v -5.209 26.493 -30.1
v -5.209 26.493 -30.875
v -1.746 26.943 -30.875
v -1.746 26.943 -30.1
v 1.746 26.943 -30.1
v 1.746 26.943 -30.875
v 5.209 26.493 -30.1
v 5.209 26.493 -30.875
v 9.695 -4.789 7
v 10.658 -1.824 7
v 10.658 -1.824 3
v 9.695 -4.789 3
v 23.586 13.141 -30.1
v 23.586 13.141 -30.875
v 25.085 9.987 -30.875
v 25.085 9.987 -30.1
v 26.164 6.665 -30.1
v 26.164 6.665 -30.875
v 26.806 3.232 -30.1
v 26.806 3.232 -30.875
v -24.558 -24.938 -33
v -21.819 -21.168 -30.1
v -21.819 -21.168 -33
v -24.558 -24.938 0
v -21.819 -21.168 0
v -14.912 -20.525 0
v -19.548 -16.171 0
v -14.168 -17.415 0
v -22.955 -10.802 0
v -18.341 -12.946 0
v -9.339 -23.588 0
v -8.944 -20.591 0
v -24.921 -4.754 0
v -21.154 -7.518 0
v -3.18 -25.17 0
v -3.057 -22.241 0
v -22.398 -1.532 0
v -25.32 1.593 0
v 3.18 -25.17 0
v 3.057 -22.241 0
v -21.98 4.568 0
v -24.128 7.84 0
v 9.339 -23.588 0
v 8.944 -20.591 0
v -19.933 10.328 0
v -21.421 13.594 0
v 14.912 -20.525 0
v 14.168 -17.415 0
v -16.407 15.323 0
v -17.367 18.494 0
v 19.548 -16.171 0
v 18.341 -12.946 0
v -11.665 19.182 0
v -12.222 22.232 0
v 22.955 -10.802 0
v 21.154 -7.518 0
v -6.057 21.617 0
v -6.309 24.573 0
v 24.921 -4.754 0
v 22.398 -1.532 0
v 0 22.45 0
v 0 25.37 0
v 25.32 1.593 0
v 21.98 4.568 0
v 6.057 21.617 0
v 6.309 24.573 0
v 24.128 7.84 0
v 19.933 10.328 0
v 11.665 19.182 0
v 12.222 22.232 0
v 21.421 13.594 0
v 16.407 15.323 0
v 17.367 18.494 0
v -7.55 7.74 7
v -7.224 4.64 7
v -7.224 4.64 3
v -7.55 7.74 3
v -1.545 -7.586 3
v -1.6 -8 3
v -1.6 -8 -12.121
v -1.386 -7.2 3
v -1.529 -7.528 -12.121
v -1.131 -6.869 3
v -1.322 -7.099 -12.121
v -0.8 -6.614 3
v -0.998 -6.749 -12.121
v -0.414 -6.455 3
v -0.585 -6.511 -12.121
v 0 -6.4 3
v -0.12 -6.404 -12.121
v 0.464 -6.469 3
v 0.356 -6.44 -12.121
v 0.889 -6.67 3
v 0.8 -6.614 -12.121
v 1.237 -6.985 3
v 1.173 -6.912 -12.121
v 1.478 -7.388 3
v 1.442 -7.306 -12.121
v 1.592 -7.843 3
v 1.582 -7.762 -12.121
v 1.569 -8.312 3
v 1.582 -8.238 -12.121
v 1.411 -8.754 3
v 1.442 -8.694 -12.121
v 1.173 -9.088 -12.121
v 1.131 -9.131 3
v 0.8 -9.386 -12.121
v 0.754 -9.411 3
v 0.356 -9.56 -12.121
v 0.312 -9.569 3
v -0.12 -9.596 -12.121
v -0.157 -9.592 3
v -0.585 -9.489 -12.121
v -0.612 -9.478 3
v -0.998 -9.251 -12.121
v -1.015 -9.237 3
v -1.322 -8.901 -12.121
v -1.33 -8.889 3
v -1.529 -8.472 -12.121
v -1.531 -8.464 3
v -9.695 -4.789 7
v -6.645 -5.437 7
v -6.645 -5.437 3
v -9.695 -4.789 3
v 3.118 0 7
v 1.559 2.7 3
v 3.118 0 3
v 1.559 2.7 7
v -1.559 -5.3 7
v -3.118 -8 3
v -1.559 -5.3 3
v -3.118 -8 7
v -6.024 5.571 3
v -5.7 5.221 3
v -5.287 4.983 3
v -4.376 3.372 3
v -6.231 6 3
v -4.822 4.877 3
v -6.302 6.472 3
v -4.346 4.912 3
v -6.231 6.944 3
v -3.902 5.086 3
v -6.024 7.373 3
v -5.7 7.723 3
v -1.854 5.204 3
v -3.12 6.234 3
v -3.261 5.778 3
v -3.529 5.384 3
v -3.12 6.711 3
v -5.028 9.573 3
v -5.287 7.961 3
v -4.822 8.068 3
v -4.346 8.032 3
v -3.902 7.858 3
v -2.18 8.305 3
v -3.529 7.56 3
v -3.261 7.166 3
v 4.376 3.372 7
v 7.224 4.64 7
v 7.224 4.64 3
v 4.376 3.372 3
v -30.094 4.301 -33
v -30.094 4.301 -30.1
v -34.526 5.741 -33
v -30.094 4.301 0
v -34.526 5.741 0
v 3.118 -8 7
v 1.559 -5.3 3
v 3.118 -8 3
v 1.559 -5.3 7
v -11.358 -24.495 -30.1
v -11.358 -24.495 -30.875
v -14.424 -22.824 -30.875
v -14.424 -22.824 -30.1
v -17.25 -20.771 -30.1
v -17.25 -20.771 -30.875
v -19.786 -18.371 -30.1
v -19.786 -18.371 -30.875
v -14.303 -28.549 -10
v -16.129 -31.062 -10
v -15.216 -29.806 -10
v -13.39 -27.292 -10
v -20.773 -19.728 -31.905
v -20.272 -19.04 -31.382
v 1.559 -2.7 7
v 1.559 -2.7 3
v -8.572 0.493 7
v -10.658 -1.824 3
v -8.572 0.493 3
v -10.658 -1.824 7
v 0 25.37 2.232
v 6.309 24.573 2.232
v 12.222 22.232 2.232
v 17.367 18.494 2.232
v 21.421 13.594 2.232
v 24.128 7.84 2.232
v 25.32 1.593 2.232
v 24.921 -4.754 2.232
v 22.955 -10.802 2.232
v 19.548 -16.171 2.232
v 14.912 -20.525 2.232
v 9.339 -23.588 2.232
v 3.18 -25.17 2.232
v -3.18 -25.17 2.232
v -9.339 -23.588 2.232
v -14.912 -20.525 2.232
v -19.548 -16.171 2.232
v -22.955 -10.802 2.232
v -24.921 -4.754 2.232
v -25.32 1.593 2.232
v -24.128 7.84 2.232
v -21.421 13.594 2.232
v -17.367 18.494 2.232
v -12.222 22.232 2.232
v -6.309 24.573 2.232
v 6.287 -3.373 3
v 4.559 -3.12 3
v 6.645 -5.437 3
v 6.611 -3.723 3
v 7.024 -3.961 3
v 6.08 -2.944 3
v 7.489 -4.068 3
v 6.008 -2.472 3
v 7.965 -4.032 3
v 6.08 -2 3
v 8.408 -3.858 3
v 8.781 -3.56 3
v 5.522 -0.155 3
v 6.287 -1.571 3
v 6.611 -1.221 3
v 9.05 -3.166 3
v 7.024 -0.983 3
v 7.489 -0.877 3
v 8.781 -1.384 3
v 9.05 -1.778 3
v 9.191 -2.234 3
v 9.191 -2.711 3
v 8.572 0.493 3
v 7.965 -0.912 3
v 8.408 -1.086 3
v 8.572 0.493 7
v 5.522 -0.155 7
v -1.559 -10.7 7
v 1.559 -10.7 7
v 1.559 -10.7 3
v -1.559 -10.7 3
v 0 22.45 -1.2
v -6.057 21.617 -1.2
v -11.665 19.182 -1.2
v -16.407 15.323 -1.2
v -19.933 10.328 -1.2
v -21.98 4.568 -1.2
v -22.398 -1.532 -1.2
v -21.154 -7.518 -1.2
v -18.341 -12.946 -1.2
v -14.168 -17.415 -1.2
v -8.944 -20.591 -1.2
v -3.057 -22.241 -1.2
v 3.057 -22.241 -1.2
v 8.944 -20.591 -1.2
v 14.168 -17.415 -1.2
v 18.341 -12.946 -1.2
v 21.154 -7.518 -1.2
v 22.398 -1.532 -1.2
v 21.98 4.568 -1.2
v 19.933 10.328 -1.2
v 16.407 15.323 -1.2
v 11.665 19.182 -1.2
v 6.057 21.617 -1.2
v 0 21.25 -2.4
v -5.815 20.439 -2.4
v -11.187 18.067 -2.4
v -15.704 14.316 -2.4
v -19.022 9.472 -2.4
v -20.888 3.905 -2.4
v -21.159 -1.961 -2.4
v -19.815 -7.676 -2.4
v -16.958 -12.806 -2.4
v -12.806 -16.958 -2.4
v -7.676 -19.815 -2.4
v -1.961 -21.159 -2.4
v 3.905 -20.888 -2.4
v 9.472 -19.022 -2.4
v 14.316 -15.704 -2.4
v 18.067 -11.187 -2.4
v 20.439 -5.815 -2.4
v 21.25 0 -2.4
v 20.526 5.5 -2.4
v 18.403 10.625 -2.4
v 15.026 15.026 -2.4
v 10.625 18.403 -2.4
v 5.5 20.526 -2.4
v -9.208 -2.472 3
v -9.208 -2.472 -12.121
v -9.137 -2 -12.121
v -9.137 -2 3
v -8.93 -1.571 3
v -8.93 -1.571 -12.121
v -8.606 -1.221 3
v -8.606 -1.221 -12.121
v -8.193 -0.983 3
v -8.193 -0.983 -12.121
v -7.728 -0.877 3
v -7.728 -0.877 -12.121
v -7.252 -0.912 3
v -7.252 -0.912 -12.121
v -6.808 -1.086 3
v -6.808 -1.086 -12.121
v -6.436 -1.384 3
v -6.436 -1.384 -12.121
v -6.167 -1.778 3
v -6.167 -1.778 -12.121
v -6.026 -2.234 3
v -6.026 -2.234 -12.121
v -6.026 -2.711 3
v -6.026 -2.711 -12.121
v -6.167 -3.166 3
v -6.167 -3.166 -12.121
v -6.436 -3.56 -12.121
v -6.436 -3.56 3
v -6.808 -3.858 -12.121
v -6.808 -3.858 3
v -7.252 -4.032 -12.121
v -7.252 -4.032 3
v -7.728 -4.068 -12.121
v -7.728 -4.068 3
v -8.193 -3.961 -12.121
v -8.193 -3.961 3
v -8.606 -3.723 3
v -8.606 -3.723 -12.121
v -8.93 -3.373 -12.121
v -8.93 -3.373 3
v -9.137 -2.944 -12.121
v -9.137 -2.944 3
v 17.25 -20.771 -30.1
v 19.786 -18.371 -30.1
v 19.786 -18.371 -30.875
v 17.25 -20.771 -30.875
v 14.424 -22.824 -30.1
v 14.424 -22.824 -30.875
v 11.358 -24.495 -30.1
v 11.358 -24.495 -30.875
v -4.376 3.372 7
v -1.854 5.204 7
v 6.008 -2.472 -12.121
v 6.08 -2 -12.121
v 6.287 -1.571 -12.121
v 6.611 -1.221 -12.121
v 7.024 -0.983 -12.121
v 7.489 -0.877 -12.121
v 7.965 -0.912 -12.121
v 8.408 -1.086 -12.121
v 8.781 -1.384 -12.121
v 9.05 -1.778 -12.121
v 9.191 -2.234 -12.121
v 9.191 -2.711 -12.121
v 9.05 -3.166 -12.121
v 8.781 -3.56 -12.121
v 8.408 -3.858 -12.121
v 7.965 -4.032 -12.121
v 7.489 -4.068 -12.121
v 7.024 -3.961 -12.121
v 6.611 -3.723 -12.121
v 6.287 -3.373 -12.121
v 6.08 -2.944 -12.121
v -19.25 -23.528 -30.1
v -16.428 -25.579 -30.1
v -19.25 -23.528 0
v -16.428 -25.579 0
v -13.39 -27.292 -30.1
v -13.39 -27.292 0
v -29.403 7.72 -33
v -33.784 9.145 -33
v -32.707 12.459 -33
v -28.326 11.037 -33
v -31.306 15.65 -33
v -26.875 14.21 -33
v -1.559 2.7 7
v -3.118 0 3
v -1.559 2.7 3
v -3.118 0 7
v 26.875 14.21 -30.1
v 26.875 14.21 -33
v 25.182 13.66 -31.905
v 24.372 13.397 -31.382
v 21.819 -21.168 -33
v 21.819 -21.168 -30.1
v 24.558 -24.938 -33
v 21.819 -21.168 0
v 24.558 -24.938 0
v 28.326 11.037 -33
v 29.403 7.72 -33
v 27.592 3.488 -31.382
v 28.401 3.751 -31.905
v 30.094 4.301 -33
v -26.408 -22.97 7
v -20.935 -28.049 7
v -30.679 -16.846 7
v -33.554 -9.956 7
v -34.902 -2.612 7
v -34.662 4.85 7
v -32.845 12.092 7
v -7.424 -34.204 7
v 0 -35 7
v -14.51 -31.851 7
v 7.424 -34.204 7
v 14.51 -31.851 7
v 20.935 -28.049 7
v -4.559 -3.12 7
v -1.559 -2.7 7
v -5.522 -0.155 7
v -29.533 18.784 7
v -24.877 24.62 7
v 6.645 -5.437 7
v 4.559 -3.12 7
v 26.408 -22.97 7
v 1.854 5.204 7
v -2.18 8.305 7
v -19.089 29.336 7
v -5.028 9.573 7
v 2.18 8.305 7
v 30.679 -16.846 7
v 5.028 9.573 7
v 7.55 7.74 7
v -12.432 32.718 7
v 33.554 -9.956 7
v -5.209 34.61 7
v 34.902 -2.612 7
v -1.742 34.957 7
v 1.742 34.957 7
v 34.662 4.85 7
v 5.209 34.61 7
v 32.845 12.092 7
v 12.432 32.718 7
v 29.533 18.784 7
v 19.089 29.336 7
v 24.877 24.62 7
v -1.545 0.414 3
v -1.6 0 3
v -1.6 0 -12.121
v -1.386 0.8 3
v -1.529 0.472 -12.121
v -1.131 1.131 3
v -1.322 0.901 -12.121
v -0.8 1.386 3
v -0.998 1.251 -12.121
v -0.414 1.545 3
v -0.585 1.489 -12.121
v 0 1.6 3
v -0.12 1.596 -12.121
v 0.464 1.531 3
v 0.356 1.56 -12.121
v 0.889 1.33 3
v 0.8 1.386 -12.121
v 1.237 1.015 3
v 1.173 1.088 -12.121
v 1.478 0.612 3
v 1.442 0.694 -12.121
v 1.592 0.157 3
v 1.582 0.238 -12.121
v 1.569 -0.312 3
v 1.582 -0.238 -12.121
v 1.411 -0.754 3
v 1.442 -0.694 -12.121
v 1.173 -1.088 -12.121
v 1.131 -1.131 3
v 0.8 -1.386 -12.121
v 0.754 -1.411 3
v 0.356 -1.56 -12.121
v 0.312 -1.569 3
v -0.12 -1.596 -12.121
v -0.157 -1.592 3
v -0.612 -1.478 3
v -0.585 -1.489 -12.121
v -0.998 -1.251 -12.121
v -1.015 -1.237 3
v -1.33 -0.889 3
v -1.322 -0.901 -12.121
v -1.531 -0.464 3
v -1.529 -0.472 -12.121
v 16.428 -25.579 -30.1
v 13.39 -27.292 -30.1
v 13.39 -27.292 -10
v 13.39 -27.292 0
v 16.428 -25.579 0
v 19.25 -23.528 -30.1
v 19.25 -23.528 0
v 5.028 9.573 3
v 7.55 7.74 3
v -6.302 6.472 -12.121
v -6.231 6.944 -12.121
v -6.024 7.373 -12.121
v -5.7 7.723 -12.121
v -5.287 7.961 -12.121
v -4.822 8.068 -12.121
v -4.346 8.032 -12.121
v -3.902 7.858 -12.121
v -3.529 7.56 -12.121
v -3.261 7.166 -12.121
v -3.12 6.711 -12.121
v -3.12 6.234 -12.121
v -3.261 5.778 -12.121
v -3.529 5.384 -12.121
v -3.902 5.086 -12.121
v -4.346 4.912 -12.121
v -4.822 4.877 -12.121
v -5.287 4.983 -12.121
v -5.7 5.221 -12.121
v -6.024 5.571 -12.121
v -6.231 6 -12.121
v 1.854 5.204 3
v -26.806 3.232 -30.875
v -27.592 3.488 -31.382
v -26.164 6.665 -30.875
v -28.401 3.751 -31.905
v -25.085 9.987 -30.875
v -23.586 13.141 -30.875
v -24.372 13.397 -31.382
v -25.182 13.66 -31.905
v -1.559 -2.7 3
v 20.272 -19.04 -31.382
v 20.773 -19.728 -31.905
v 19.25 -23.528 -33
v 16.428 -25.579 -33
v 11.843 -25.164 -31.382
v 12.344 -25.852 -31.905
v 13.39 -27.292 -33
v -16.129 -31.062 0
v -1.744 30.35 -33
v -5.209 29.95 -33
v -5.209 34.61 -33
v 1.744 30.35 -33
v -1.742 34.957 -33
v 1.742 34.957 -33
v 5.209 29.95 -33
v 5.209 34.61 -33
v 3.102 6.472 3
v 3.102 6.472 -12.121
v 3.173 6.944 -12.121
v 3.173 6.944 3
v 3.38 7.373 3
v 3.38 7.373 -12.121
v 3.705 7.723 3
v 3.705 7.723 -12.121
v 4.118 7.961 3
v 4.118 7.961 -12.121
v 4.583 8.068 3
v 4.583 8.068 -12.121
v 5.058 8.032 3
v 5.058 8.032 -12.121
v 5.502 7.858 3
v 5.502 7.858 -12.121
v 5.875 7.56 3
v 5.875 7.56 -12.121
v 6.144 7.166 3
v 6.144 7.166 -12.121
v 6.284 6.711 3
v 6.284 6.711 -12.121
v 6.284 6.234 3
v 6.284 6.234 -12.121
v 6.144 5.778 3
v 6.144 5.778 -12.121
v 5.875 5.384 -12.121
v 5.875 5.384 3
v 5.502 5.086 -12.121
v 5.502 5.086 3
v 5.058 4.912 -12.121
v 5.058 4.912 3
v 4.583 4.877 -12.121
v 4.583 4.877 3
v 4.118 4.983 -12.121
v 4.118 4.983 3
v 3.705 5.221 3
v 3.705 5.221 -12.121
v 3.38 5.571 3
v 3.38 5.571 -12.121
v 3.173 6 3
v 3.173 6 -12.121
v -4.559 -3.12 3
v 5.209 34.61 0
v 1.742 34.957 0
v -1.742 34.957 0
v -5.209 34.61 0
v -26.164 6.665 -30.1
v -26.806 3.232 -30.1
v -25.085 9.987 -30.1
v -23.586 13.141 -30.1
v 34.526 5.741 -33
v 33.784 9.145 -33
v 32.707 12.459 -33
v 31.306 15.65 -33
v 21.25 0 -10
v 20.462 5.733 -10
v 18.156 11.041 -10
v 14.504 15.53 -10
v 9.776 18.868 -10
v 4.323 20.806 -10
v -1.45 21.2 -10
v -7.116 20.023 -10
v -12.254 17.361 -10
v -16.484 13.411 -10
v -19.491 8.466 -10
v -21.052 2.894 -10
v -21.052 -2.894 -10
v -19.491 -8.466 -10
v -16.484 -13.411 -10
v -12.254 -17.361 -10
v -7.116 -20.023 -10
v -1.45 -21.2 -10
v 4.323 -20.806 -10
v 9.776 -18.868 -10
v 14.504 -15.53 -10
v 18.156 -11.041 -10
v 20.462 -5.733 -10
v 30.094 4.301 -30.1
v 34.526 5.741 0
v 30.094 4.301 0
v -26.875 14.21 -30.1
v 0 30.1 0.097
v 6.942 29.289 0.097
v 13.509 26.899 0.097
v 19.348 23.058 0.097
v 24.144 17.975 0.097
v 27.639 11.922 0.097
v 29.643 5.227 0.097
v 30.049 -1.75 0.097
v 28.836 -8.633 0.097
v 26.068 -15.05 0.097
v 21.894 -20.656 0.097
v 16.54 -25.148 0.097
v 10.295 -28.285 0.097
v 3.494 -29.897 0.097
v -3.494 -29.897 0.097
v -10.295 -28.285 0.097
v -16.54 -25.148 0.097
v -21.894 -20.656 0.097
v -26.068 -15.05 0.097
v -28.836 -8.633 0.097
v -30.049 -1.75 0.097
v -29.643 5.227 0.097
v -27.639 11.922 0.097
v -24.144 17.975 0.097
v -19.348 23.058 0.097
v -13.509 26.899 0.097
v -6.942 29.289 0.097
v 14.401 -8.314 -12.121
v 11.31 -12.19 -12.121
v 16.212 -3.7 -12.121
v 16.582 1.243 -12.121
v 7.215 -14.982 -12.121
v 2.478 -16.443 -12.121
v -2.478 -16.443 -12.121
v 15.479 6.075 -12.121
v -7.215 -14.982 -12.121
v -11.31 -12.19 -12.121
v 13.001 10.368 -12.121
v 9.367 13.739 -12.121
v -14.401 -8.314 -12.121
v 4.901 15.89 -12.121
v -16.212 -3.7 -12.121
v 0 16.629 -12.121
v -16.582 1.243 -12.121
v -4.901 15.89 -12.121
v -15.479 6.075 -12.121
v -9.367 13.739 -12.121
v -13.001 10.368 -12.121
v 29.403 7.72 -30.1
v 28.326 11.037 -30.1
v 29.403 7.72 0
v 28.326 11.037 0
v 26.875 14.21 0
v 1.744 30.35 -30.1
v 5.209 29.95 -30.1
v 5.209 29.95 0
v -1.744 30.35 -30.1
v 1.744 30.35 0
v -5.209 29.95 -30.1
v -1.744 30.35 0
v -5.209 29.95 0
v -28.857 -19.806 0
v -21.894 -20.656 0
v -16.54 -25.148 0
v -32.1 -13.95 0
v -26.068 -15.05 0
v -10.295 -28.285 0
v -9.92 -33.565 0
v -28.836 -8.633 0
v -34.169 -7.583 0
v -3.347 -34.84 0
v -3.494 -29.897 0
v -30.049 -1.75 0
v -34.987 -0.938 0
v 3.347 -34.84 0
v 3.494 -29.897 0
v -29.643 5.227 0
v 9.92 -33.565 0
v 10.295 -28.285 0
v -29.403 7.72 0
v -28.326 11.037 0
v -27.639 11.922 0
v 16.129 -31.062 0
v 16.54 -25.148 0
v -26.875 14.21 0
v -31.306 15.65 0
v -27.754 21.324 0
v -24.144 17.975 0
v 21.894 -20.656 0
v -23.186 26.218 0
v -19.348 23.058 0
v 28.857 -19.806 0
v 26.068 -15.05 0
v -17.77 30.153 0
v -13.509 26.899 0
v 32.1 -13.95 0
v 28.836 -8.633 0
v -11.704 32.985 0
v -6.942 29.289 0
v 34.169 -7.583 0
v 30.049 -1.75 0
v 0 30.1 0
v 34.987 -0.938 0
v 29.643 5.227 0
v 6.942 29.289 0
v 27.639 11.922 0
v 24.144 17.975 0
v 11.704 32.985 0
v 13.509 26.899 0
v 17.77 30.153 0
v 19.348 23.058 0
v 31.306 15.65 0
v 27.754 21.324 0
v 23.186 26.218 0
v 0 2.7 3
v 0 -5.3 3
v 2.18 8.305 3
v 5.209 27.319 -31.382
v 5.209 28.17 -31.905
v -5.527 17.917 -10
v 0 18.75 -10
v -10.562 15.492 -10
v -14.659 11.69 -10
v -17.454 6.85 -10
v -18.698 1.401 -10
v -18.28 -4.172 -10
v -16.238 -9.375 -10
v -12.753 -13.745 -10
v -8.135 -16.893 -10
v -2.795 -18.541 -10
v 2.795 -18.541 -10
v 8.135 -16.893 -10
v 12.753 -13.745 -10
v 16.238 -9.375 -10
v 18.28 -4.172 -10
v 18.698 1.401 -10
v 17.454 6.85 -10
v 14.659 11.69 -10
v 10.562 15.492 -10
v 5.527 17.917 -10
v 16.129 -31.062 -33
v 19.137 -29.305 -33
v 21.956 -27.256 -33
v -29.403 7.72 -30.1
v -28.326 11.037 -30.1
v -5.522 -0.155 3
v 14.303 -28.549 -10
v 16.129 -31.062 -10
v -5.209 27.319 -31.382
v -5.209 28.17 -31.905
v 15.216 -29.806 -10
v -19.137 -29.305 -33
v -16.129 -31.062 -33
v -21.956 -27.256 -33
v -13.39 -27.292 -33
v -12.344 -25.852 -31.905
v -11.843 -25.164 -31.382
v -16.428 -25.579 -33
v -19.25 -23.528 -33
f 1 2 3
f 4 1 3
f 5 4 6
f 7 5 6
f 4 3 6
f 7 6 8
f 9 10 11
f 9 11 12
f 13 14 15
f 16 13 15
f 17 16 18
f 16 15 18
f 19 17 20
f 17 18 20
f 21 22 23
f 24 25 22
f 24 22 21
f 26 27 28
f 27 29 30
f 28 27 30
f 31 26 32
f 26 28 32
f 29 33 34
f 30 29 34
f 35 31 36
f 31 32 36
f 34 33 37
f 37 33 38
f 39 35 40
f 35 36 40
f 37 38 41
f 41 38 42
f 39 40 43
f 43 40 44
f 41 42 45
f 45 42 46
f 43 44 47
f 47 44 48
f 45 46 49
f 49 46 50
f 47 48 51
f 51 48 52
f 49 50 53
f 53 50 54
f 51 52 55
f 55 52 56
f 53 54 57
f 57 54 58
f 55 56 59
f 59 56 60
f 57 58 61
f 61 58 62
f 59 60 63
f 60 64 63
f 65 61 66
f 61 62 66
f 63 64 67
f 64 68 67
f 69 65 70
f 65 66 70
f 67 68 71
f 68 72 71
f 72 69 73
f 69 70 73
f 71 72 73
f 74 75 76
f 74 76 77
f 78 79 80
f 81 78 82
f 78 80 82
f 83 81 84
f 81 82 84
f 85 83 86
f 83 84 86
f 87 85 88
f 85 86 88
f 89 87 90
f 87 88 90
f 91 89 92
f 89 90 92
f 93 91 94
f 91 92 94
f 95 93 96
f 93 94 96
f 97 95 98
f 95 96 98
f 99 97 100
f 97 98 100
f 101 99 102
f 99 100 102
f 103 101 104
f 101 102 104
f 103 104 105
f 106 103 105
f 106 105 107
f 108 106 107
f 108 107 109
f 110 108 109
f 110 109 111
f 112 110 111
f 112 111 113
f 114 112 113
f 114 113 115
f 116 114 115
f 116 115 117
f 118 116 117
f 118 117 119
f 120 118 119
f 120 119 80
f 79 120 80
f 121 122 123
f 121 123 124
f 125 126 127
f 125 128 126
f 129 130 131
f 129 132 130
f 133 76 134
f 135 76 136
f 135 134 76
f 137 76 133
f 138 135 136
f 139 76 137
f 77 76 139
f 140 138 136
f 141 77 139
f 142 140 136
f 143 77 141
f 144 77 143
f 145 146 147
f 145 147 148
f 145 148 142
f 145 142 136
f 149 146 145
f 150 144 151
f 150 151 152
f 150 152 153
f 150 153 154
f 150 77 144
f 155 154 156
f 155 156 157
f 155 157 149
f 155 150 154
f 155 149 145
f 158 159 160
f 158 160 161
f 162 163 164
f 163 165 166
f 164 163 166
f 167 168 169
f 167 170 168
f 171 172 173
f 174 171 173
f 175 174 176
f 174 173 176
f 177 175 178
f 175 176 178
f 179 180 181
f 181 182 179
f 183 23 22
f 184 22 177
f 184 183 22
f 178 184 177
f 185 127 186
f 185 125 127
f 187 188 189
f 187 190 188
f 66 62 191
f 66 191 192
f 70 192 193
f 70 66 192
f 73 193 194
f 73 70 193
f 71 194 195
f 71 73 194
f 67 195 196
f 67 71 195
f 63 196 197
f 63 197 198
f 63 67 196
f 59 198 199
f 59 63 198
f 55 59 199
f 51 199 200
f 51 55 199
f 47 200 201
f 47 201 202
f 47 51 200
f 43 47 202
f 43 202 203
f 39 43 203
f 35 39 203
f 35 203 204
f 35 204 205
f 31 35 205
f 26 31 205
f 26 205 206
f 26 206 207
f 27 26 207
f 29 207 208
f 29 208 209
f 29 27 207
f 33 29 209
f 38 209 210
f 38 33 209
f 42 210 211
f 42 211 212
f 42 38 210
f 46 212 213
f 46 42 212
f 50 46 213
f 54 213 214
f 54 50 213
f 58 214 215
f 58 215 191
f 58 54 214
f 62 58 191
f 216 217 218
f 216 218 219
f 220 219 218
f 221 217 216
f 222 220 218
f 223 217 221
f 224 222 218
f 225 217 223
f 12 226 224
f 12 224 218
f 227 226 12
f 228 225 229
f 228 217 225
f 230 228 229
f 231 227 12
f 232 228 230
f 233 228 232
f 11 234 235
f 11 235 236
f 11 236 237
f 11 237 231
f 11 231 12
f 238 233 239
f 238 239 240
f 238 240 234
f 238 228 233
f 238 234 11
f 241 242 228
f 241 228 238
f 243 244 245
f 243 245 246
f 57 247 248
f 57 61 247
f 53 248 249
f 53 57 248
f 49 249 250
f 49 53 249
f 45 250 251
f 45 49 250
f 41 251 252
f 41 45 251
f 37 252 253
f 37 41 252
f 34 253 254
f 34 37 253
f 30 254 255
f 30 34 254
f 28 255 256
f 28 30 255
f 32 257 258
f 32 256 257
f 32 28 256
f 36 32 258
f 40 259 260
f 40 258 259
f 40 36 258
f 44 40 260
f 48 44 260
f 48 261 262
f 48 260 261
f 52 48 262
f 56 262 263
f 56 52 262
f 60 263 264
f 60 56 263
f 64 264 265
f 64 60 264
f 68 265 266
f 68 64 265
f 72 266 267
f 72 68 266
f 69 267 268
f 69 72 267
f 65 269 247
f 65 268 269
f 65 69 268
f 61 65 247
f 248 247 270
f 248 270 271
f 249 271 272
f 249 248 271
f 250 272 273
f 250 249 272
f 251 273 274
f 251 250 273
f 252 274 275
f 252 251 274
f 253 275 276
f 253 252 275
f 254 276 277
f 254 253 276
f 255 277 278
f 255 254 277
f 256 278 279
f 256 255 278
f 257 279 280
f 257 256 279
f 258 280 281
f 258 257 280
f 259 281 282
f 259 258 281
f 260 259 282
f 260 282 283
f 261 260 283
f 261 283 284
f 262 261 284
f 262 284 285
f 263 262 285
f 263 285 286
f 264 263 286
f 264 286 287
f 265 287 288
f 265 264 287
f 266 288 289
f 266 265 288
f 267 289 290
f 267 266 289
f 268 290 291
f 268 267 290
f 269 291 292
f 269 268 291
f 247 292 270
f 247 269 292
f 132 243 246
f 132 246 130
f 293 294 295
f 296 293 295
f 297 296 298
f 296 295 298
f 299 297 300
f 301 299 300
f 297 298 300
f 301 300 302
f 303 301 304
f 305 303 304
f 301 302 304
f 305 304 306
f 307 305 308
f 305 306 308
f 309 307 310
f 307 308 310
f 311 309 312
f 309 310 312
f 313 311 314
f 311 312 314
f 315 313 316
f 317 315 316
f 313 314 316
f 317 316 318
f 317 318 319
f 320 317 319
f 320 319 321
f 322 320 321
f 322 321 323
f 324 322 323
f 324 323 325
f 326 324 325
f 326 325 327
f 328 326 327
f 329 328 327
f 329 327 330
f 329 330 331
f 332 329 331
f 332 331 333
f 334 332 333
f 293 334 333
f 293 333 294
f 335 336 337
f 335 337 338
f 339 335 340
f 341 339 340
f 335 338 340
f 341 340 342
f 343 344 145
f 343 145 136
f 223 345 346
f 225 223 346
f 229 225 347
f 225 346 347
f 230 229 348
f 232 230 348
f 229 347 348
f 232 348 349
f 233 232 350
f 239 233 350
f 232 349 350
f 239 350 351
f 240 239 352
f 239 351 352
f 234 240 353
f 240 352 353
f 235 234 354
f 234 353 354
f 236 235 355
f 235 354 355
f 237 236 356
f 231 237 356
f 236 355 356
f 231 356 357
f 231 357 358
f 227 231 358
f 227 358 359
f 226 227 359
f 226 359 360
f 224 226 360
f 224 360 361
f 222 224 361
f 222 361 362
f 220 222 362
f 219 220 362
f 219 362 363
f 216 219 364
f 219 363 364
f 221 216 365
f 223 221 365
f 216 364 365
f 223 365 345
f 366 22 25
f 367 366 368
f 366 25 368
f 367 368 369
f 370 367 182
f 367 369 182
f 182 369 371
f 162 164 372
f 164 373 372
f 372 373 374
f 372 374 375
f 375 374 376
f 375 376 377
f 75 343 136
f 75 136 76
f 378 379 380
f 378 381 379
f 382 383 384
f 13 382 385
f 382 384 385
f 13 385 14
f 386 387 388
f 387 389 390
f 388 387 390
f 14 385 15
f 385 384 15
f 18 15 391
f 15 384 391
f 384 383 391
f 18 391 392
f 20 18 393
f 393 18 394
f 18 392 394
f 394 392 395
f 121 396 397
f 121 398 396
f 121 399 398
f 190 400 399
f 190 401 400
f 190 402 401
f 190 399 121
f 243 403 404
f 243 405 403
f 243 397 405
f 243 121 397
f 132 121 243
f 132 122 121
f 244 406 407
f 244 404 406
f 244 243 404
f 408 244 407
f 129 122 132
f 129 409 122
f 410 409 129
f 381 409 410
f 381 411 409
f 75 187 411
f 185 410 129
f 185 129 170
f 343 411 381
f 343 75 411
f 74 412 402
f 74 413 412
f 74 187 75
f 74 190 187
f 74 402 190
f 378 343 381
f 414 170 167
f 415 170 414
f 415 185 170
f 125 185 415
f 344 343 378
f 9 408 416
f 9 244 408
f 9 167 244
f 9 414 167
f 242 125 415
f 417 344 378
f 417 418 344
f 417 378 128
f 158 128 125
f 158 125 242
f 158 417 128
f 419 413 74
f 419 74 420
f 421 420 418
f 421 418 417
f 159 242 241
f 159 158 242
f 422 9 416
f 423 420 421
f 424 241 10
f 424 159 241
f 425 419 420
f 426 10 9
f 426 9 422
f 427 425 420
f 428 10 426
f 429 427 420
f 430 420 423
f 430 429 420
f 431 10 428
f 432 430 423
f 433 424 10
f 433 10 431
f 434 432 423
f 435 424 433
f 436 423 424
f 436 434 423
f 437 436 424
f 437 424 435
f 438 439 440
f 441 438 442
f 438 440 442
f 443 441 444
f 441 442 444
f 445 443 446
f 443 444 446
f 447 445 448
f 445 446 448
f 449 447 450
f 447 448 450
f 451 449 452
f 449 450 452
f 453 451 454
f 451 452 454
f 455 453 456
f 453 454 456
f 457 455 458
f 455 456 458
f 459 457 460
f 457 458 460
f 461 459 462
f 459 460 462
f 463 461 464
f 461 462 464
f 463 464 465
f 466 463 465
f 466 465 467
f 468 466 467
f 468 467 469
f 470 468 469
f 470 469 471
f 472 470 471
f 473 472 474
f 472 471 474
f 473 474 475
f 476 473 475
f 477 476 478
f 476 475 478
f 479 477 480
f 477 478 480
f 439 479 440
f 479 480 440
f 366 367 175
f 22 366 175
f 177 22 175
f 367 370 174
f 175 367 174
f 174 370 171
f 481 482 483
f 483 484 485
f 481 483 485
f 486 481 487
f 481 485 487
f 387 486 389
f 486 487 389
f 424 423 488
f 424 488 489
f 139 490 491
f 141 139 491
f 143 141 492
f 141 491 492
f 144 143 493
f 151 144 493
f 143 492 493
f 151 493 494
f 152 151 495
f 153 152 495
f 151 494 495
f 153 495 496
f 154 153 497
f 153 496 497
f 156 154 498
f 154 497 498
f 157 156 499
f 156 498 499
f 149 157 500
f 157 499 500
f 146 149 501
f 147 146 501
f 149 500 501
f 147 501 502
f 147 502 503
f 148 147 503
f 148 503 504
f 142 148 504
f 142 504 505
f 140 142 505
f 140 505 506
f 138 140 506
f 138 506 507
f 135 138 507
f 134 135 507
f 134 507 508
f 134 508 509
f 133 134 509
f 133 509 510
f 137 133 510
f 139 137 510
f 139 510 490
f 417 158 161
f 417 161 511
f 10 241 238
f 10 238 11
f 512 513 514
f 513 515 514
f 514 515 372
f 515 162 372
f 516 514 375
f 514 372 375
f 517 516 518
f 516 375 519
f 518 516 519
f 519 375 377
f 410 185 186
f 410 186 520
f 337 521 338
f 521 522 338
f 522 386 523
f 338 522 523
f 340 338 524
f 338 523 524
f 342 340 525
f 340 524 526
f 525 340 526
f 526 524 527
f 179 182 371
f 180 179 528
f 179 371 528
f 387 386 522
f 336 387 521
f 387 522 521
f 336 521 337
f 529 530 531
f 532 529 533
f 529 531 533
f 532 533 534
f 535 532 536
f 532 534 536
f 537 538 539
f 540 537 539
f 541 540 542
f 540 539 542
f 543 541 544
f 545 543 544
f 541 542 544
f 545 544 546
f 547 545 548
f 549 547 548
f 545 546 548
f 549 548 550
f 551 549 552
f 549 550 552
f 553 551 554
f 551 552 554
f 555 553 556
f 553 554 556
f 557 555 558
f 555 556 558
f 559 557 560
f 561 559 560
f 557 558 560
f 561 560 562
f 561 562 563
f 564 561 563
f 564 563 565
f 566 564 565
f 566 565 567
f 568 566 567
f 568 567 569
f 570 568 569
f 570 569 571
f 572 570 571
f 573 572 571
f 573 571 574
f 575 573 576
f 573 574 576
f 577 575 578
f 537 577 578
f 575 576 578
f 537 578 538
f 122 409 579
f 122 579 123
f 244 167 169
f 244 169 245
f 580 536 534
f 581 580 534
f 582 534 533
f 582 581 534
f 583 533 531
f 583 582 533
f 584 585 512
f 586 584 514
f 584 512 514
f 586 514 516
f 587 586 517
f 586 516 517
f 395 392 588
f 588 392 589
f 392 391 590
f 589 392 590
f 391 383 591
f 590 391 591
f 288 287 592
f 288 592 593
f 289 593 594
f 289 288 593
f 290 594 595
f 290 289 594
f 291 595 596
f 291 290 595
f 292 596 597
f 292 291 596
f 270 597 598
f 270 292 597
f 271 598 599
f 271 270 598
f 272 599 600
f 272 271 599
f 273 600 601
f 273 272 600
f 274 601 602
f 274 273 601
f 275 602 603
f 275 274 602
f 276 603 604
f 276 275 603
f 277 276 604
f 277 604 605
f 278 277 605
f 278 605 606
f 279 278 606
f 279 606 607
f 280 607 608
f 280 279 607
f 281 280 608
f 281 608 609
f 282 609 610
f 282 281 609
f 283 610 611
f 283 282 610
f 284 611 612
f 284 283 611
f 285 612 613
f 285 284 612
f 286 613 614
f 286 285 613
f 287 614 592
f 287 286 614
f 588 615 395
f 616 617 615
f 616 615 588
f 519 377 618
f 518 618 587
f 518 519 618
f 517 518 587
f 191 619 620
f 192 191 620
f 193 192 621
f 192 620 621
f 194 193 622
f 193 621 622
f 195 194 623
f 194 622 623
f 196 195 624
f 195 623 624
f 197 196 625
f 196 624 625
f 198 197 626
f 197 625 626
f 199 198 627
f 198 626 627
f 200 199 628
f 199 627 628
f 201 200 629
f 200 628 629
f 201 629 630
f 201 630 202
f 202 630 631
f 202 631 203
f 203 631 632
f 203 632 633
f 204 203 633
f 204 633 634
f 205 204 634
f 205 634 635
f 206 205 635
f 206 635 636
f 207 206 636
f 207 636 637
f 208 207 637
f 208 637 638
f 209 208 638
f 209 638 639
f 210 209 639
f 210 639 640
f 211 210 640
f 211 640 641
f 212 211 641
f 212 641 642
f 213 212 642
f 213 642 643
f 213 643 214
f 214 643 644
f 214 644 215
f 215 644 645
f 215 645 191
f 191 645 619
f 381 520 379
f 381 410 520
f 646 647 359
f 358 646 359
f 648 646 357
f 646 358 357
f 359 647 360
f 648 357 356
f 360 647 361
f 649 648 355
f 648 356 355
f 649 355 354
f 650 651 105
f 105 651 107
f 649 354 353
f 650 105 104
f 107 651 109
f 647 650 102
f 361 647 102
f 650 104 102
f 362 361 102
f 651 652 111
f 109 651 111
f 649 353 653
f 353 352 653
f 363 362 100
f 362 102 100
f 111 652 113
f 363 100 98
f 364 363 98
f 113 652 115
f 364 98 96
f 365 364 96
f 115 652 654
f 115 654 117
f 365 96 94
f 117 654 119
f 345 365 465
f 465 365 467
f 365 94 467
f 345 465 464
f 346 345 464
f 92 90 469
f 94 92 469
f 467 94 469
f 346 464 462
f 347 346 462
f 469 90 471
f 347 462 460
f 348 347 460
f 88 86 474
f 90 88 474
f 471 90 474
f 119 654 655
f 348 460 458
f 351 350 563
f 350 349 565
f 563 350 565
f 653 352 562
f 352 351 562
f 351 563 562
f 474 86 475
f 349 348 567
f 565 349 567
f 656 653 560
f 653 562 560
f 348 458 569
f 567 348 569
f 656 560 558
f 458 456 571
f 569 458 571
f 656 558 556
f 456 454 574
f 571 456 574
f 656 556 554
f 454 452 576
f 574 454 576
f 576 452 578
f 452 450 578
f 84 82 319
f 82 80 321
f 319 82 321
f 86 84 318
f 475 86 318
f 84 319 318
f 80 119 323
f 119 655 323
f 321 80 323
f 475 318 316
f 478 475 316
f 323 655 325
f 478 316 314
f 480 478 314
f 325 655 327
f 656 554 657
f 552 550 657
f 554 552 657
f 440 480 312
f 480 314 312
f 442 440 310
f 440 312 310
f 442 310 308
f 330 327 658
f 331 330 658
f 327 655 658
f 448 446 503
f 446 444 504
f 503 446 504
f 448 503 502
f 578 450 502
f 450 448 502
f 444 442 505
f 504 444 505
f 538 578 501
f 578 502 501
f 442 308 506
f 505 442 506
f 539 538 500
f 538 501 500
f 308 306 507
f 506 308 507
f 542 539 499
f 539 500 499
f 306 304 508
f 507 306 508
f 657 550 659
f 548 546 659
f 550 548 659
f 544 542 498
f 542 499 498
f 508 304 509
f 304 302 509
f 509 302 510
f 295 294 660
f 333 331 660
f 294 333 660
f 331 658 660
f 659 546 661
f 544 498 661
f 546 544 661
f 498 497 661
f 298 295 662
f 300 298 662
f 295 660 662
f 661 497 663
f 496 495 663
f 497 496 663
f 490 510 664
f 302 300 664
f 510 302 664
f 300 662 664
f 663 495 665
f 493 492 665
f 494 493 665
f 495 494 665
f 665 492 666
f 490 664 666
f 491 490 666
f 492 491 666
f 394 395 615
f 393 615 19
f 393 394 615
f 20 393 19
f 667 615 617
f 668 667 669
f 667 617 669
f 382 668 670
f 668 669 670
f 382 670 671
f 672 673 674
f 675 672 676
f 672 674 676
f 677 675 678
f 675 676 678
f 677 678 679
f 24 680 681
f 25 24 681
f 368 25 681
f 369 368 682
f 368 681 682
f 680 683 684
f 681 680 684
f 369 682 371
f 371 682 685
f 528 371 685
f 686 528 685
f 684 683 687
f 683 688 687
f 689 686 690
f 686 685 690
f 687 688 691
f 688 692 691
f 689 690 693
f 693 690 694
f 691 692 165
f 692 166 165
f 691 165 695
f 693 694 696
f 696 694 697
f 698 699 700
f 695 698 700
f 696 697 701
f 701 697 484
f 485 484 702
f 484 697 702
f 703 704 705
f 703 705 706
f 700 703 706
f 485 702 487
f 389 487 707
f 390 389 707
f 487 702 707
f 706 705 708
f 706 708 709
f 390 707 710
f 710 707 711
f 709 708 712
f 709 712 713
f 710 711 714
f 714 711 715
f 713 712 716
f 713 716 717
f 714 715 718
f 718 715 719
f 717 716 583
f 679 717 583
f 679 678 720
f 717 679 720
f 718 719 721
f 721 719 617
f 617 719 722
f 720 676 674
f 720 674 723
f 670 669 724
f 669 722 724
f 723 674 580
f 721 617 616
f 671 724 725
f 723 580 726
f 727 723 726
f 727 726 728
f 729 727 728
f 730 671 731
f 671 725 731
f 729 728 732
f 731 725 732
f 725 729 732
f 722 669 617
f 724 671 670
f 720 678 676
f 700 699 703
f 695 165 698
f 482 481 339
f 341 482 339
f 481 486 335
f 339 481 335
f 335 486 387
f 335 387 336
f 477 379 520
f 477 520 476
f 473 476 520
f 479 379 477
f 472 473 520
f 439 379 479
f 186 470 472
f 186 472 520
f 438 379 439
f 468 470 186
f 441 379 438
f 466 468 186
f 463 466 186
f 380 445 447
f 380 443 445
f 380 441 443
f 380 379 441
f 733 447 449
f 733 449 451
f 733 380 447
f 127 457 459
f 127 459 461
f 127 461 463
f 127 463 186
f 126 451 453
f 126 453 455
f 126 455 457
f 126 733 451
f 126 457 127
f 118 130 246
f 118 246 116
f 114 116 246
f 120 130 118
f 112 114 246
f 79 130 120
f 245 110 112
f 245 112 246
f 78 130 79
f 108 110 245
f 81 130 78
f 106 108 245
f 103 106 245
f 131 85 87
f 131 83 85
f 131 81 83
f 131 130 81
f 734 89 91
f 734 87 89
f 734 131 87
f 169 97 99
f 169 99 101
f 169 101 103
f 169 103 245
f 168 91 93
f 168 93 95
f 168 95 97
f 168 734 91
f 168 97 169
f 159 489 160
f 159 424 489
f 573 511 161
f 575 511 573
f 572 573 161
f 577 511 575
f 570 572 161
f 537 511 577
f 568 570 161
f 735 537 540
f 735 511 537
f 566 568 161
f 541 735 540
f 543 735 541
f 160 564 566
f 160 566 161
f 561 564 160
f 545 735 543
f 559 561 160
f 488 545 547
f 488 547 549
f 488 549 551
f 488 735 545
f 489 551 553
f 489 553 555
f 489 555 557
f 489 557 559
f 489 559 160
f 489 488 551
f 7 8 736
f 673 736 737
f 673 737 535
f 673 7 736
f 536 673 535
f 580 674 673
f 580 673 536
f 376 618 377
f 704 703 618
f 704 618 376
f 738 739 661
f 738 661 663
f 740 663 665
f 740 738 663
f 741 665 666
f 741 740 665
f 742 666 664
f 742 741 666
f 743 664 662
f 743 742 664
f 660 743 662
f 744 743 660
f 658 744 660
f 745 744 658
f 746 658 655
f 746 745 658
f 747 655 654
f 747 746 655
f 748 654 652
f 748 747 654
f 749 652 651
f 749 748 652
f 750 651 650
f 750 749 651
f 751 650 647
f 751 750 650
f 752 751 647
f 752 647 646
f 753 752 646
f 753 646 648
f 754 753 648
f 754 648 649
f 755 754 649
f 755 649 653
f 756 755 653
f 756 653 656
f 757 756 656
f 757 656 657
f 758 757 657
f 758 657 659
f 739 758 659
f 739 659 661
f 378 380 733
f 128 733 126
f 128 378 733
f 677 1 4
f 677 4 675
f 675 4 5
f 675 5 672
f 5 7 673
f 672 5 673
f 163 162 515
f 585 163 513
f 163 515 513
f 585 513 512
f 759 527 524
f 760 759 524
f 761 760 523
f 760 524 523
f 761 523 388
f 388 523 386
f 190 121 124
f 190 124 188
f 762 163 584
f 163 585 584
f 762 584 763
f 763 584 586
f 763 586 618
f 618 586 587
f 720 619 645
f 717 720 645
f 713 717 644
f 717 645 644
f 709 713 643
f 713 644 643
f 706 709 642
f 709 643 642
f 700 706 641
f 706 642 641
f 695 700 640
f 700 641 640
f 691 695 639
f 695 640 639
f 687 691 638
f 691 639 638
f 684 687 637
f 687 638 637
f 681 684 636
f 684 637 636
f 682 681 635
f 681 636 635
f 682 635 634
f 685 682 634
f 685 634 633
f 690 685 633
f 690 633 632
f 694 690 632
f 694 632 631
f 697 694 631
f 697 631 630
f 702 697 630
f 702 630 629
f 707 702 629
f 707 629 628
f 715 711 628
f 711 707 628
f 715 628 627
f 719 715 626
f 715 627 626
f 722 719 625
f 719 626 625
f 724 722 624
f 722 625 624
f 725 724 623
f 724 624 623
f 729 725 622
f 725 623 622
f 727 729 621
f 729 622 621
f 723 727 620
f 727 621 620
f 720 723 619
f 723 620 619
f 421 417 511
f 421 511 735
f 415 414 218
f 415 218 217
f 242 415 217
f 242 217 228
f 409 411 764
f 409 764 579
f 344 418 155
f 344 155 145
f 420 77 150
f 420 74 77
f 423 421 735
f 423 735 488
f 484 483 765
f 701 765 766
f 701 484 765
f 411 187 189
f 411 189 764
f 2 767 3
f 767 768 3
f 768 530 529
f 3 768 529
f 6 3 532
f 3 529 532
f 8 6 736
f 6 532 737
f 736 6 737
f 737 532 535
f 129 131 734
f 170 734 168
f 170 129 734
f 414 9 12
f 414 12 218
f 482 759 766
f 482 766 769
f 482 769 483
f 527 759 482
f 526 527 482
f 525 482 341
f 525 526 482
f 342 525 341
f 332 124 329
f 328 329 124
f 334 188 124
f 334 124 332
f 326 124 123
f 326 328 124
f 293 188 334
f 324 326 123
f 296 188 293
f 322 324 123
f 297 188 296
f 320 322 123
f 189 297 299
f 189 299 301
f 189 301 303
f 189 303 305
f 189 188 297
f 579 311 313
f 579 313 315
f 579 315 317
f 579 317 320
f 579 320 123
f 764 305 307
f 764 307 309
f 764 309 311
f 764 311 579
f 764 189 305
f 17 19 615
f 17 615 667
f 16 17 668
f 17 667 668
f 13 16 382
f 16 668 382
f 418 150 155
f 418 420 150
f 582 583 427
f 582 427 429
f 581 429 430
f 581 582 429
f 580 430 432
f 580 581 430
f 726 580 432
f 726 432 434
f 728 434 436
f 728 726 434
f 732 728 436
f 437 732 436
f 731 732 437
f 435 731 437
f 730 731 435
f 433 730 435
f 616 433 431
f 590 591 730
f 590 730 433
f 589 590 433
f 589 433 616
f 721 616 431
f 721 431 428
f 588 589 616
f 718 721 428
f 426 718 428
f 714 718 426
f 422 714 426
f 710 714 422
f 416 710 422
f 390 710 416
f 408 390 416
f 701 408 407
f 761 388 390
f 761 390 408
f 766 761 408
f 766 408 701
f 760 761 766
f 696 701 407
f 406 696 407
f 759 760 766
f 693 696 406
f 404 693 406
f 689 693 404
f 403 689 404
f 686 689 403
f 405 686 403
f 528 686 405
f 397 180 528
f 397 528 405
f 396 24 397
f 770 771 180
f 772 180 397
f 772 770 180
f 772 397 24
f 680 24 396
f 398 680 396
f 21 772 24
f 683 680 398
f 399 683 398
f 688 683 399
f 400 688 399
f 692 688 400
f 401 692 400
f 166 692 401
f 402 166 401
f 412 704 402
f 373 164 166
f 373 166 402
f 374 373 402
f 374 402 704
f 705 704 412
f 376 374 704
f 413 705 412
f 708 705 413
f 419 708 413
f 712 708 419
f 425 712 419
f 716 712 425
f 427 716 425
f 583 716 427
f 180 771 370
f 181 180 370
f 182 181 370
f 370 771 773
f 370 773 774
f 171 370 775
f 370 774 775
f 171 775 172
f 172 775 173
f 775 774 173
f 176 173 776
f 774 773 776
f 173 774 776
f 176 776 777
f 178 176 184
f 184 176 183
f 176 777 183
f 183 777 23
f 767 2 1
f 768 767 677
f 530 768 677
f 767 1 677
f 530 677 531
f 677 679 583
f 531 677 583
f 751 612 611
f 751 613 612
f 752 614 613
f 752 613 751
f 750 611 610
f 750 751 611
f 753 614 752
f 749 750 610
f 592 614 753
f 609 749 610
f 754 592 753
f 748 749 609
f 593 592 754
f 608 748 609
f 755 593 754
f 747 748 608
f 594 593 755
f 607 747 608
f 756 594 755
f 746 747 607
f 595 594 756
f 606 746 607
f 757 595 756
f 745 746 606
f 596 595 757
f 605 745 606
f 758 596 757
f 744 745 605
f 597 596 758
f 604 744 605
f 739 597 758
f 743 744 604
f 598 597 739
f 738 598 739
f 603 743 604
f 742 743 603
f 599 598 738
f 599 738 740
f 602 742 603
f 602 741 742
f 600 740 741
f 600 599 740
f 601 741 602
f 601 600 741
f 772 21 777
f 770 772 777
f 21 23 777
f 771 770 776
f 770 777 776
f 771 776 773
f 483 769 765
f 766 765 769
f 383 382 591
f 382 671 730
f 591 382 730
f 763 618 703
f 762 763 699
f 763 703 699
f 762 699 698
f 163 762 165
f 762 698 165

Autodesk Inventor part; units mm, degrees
ref_plane "YZ Plane" through (0, 0, 0) normal (1, 0, 0) x (0, 1, 0)
ref_plane "XZ Plane" through (0, 0, 0) normal (0, 1, 0) x (-1, 0, 0)
ref_plane "XY Plane" through (0, 0, 0) normal (0, 0, 1) x (1, 0, 0)
sketch "Эскиз1" plane through (0, 0, 0) normal (0, 0, 1) x (1, 0, 0)
  circle A0 centre (0, 0) radius 21.25 projected
  circle A1 centre (0, 0) radius 30 projected
  circle A2 centre (0, 0) radius 21.25
  circle A3 centre (0, 0) radius 30
  circle A4 centre (0, 0) radius 35
  line L0 (0, 0) -> (6.0777, 34.4683)
  line L1 (0, 0) -> (35, 0) construction
  line L2 (0, 0) -> (-6.0777, 34.4683)
  line L3 (0, 0) -> (35, 0) construction
  line L4 (-5.2094, 29.5442) -> (-5.2094, 34.6101)
  line L5 (5.2094, 29.5442) -> (5.2094, 34.6101)
  line L6 (-26.4884, 14.0841) -> (-31.3064, 15.6496)
  line L7 (-29.708, 4.1752) -> (-34.526, 5.7406)
  line L8 (-21.5802, -20.8398) -> (-24.5579, -24.9382)
  line L9 (-13.1511, -26.9638) -> (-16.1288, -31.0622)
  line L10 (13.1511, -26.9638) -> (16.1288, -31.0622)
  line L11 (21.5802, -20.8398) -> (24.5579, -24.9382)
  line L12 (29.708, 4.1752) -> (34.526, 5.7406)
  line L13 (26.4884, 14.0841) -> (31.3064, 15.6496)
  circle A5 centre (0, 0) radius 30.4
  point P0 (0, 0)
  point P1 (5.2094, 29.5442)
  point P2 (-5.2094, 29.5442)
  point P3 (-5.2094, 29.9503)
  point P4 (5.2094, 29.9503)
  point P5 (26.8746, 14.2096)
  point P6 (30.0943, 4.3007)
  point P7 (-30.0943, 4.3007)
  point P8 (-26.8746, 14.2096)
  point P9 (-13.3898, -27.2924)
  point P10 (-21.8189, -21.1683)
  point P11 (21.8189, -21.1683)
  point P12 (13.3898, -27.2924)
  dimension "d0" = 70
  dimension "d1" = 80
  dimension "d2" = 100
  dimension "d5" = 360
  dimension "d19" = 0.4
extrude "Выдавливание1" add sketch "Эскиз1" against normal blind 33 contours A0 L2 L0 | L0 L2 A0 | A5 L4 A4 L5 | L13 A4 L12 A5 | A5 L7 A4 L6 | A5 L9 A4 L8 | L11 A4 L10 A5
sketch "Эскиз2" plane through (0, 0, 0) normal (1, 0, 0) x (0, 1, 0)
  line L0 (30, -23) -> (30, 0) projected
  line L1 (-30, -19.93) -> (30, -19.93) projected
  line L2 (0, 0) -> (0, -33)
  line L3 (-21.25, -33) -> (21.25, -33) projected
  line L4 (22.45, -18.73) -> (21.25, -17.53)
  line L5 (22.45, -19.93) -> (22.45, -18.73)
  line L6 (21.25, 0) -> (21.25, -33) projected
  line L7 (-30, -19.93) -> (30, -19.93) projected
  line L8 (21.25, -2.4) -> (22.45, -1.2)
  line L9 (22.45, -1.2) -> (22.45, 0)
  line L10 (30, 0) -> (-30, 0) projected
  line L11 (30.4, -33) -> (30.4, 0) projected
  line L12 (30.4, -33) -> (30.4, 0) projected
  line L13 (30.4, -33) -> (30.4, 0) projected
  line L14 (-30, -29.93) -> (30, -29.93) projected
  line L15 (20.7199, -30.23) -> (27.0363, -30.23) projected
  line L16 (30.4, -33) -> (30.4, 0) projected
  line L17 (30.4, -33) -> (30.4, -30.1)
  line L18 (30.4, -33) -> (30.4, 0) projected
  line L19 (30.4, -30.1) -> (26.4, -30.1)
  line L20 (26.4, -30.1) -> (26.4, -30.5)
  line L21 (26.4, -30.1) -> (26.8, -30.1) construction
  line L22 (26.4, -30.5) -> (30.4, -33)
  point P0 (21.25, -19.93)
  dimension "d25" = 2.9
  dimension "d26" = 4
  dimension "d27" = 0.4
  dimension "d28" = 90
revolve "Вращение1" add sketch "Эскиз2" angle 360 about axis through (0, 0, 0) along (0, 0, -1) contours L20 L19 L11 L22 | L1 L6 L4 L5 | L9 L8 L6 L10
sketch "Эскиз3" plane through (0, 0, -33) normal (0, 0, -1) x (-1, 0, 0)
  arc A0 (5.2094, 34.6101) -> (-5.2094, 34.6101) centre (0, 0) ccw projected
  line L0 (-5.2094, 34.6101) -> (-5.2094, 26.4927)
  line L1 (5.2094, 34.6101) -> (5.2094, 26.4927)
  circle A1 centre (0, 0) radius 35
  line L2 (-31.3064, 15.6496) -> (-23.5862, 13.1412)
  line L3 (-34.526, 5.7406) -> (-26.8058, 3.2322)
  line L4 (-24.5579, -24.9382) -> (-19.7865, -18.371)
  line L5 (-16.1288, -31.0622) -> (-11.3575, -24.4951)
  line L6 (16.1288, -31.0622) -> (11.3575, -24.4951)
  line L7 (24.5579, -24.9382) -> (19.7865, -18.371)
  line L8 (34.526, 5.7406) -> (26.8058, 3.2322)
  line L9 (31.3064, 15.6496) -> (23.5862, 13.1412)
  circle A2 centre (0, 0) radius 27
  point P0 (0, 0)
  point P1 (5.2094, 34.6101)
  point P2 (5.2094, 34.6101)
  dimension "d13" = 360
extrude "Выдавливание2" cut sketch "Эскиз3" against normal blind 23 contours A1 L9 A2 L1 | L0 A2 L2 A1 | A2 | A1 L7 A2 L8 | L3 A2 L4 A1 | L5 A2 L6 A1
sketch "Эскиз4" plane through (0, 0, 0) normal (0, 0, 1) x (1, 0, 0)
  arc A0 (5.2094, 34.6101) -> (-5.2094, 34.6101) centre (0, 0) ccw projected
  circle A1 centre (0, 0) radius 35
  point P0 (0, 0)
  point P1 (5.2094, 34.6101)
extrude "Выдавливание3" add sketch "Эскиз4" along normal blind 7
sketch "Эскиз5" plane through (0, 0, 0) normal (1, 0, 0) x (0, 1, 0)
  line L0 (-21.25, -10) -> (21.25, -10) projected
  line L1 (21.25, -10) -> (-21.25, -10) projected
  line L2 (21.25, -10) -> (18.75, -10)
  line L3 (18.75, -10) -> (16.6287, -12.1213)
  line L4 (16.6287, -12.1213) -> (0, -12.1213)
  line L5 (14.2096, 0) -> (14.2096, -30.1) projected
  line L6 (0, -12.1213) -> (0, -10)
  point P0 (0, 0)
  dimension "d29" = 2.5
  dimension "d30" = 3
  dimension "d31" = 135
revolve "Вращение2" add sketch "Эскиз5" angle 360 about axis through (0, 0, -12.1213) along (0, 0, 1)
sketch "Эскиз6" plane through (0, 0, 0) normal (1, 0, 0) x (0, 1, 0)
  line L0 (25.52, -29.93) -> (25.52, 0)
  line L1 (25.52, 0) -> (25.52, 2)
  line L2 (30.4, -30.1) -> (30.4, 0) projected
  line L3 (29.9503, 0) -> (29.9503, -30.1) projected
  line L4 (25.52, 2) -> (29.9503, 0)
  line L5 (30.1003, -30.1) -> (30.1003, 0.0969)
  line L6 (30.1003, 0.0969) -> (25.37, 2.2323)
  line L7 (25.37, 2.2323) -> (25.37, 0)
  line L8 (25.37, 0) -> (25.37, -29.93)
  line L9 (35, 7) -> (-35, 7) projected
  line L10 (0, 7) -> (0, 0)
  line L11 (25.37, 0) -> (30.3149, 0)
  line L12 (34.6101, 0) -> (15.6496, 0) projected
  point P0 (30.1003, 0)
  dimension "d33" = 0.15
revolve "Вращение3" cut sketch "Эскиз6" angle 360 about axis through (0, 0, 7) along (0, 0, -1)
sketch "Эскиз7" plane through (0, 0, -12.1213) normal (0, 0, -1) x (-1, 0, 0)
  line L0 (15.0382, 14.3621) -> (21.6953, 20.7199) projected
  arc A0 (21.6953, 20.7199) -> (13.0016, 27.0363) centre (0, 0) ccw projected
  line L1 (13.0016, 27.0363) -> (9.0121, 18.7403) projected
  arc A1 (-9.0121, 18.7403) -> (9.0121, 18.7403) centre (0, 23.0741) ccw projected
  line L2 (-9.0121, 18.7403) -> (-13.0016, 27.0363) projected
  arc A2 (-13.0016, 27.0363) -> (-21.6953, 20.7199) centre (0, 0) ccw projected
  line L3 (-21.6953, 20.7199) -> (-15.0382, 14.3621) projected
  arc A3 (-20.608, -2.7799) -> (-15.0382, 14.3621) centre (-21.9448, 7.1303) ccw projected
  line L4 (-20.608, -2.7799) -> (-29.7307, -4.0106) projected
  arc A4 (-29.7307, -4.0106) -> (-26.41, -14.2307) centre (0, 0) ccw projected
  line L5 (-26.41, -14.2307) -> (-18.3062, -9.864) projected
  arc A5 (-3.7243, -20.4584) -> (-18.3062, -9.864) centre (-13.5626, -18.6674) ccw projected
  line L6 (-3.7243, -20.4584) -> (-5.373, -29.5149) projected
  arc A6 (-5.373, -29.5149) -> (5.373, -29.5149) centre (0, 0) ccw projected
  line L7 (5.373, -29.5149) -> (3.7243, -20.4584) projected
  arc A7 (18.3062, -9.864) -> (3.7243, -20.4584) centre (13.5626, -18.6674) ccw projected
  line L8 (18.3062, -9.864) -> (26.41, -14.2307) projected
  arc A8 (26.41, -14.2307) -> (29.7307, -4.0106) centre (0, 0) ccw projected
  line L9 (29.7307, -4.0106) -> (20.608, -2.7799) projected
  arc A9 (15.0382, 14.3621) -> (20.608, -2.7799) centre (21.9448, 7.1303) ccw projected
  circle A10 centre (-4.7023, 6.4721) radius 1.6 projected
  circle A11 centre (0, 0) radius 1.6 projected
  circle A12 centre (0, -8) radius 1.6 projected
  circle A13 centre (4.7023, 6.4721) radius 1.6 projected
  circle A14 centre (7.6085, -2.4721) radius 1.6 projected
  circle A15 centre (-7.6085, -2.4721) radius 1.6 projected
  line L10 (15.0382, 14.3621) -> (21.6953, 20.7199) projected
  arc A16 (21.6953, 20.7199) -> (13.0016, 27.0363) centre (0, 0) ccw projected
  line L11 (13.0016, 27.0363) -> (9.0121, 18.7403) projected
  arc A17 (-9.0121, 18.7403) -> (9.0121, 18.7403) centre (0, 23.0741) ccw projected
  line L12 (-9.0121, 18.7403) -> (-13.0016, 27.0363) projected
  arc A18 (-13.0016, 27.0363) -> (-21.6953, 20.7199) centre (0, 0) ccw projected
  line L13 (-21.6953, 20.7199) -> (-15.0382, 14.3621) projected
  arc A19 (-20.608, -2.7799) -> (-15.0382, 14.3621) centre (-21.9448, 7.1303) ccw projected
  line L14 (-20.608, -2.7799) -> (-29.7307, -4.0106) projected
  arc A20 (-29.7307, -4.0106) -> (-26.41, -14.2307) centre (0, 0) ccw projected
  line L15 (-26.41, -14.2307) -> (-18.3062, -9.864) projected
  arc A21 (-3.7243, -20.4584) -> (-18.3062, -9.864) centre (-13.5626, -18.6674) ccw projected
  line L16 (-3.7243, -20.4584) -> (-5.373, -29.5149) projected
  arc A22 (-5.373, -29.5149) -> (5.373, -29.5149) centre (0, 0) ccw projected
  line L17 (5.373, -29.5149) -> (3.7243, -20.4584) projected
  arc A23 (18.3062, -9.864) -> (3.7243, -20.4584) centre (13.5626, -18.6674) ccw projected
  line L18 (18.3062, -9.864) -> (26.41, -14.2307) projected
  arc A24 (26.41, -14.2307) -> (29.7307, -4.0106) centre (0, 0) ccw projected
  line L19 (29.7307, -4.0106) -> (20.608, -2.7799) projected
  arc A25 (15.0382, 14.3621) -> (20.608, -2.7799) centre (21.9448, 7.1303) ccw projected
  point P0 (0, 0)
extrude "Выдавливание4" cut sketch "Эскиз7" against normal up to surface (19.1213 mm away) contours A10 | A11 | A12 | A13 | A14 | A15
sketch "Эскиз8" plane through (0, 0, 7) normal (0, 0, 1) x (1, 0, 0)
  circle A0 centre (0, 0) radius 1.6 projected
  line L0 (0, 0) -> (0, 2.7)
  circle A1 centre (0, -8) radius 1.6 projected
  line L1 (0, -8) -> (0, -5.3)
  line L2 (1.5588, -5.3) -> (3.1177, -8)
  line L3 (3.1177, -8) -> (1.5588, -10.7)
  line L4 (1.5588, -10.7) -> (-1.5588, -10.7)
  line L5 (-1.5588, -10.7) -> (-3.1177, -8)
  line L6 (-3.1177, -8) -> (-1.5588, -5.3)
  line L7 (-1.5588, -5.3) -> (1.5588, -5.3)
  line L8 (1.5588, 2.7) -> (3.1177, 0)
  line L9 (3.1177, 0) -> (1.5588, -2.7)
  line L10 (1.5588, -2.7) -> (-1.5588, -2.7)
  line L11 (-1.5588, -2.7) -> (-3.1177, 0)
  line L12 (-3.1177, 0) -> (-1.5588, 2.7)
  line L13 (-1.5588, 2.7) -> (1.5588, 2.7)
  line L14 (4.5589, -3.1203) -> (5.5223, -0.1552)
  line L15 (7.6085, -2.4721) -> (5.0406, -1.6378)
  line L16 (6.645, -5.4372) -> (4.5589, -3.1203)
  line L17 (9.6946, -4.789) -> (6.645, -5.4372)
  line L18 (10.658, -1.8239) -> (9.6946, -4.789)
  line L19 (8.5719, 0.493) -> (10.658, -1.8239)
  line L20 (5.5223, -0.1552) -> (8.5719, 0.493)
  line L21 (4.3764, 3.3715) -> (1.8541, 5.2041)
  line L22 (4.7023, 6.4721) -> (3.1153, 4.2878)
  line L23 (7.2245, 4.6396) -> (4.3764, 3.3715)
  line L24 (7.5504, 7.7402) -> (7.2245, 4.6396)
  line L25 (5.0282, 9.5727) -> (7.5504, 7.7402)
  line L26 (2.18, 8.3047) -> (5.0282, 9.5727)
  line L27 (1.8541, 5.2041) -> (2.18, 8.3047)
  line L28 (-1.8541, 5.2041) -> (-4.3764, 3.3715)
  line L29 (-4.7023, 6.4721) -> (-3.1153, 4.2878)
  line L30 (-2.18, 8.3047) -> (-1.8541, 5.2041)
  line L31 (-5.0282, 9.5727) -> (-2.18, 8.3047)
  line L32 (-7.5504, 7.7402) -> (-5.0282, 9.5727)
  line L33 (-7.2245, 4.6396) -> (-7.5504, 7.7402)
  line L34 (-4.3764, 3.3715) -> (-7.2245, 4.6396)
  line L35 (-5.5223, -0.1552) -> (-4.5589, -3.1203)
  line L36 (-7.6085, -2.4721) -> (-5.0406, -1.6378)
  line L37 (-8.5719, 0.493) -> (-5.5223, -0.1552)
  line L38 (-10.658, -1.8239) -> (-8.5719, 0.493)
  line L39 (-9.6946, -4.789) -> (-10.658, -1.8239)
  line L40 (-6.645, -5.4372) -> (-9.6946, -4.789)
  line L41 (-4.5589, -3.1203) -> (-6.645, -5.4372)
  point P0 (0, 0)
  dimension "d40" = 2.7
  dimension "d41" = 2.7
  dimension "d44" = 360
extrude "Выдавливание5" cut sketch "Эскиз8" against normal blind 4
properties part number "tire disk"
